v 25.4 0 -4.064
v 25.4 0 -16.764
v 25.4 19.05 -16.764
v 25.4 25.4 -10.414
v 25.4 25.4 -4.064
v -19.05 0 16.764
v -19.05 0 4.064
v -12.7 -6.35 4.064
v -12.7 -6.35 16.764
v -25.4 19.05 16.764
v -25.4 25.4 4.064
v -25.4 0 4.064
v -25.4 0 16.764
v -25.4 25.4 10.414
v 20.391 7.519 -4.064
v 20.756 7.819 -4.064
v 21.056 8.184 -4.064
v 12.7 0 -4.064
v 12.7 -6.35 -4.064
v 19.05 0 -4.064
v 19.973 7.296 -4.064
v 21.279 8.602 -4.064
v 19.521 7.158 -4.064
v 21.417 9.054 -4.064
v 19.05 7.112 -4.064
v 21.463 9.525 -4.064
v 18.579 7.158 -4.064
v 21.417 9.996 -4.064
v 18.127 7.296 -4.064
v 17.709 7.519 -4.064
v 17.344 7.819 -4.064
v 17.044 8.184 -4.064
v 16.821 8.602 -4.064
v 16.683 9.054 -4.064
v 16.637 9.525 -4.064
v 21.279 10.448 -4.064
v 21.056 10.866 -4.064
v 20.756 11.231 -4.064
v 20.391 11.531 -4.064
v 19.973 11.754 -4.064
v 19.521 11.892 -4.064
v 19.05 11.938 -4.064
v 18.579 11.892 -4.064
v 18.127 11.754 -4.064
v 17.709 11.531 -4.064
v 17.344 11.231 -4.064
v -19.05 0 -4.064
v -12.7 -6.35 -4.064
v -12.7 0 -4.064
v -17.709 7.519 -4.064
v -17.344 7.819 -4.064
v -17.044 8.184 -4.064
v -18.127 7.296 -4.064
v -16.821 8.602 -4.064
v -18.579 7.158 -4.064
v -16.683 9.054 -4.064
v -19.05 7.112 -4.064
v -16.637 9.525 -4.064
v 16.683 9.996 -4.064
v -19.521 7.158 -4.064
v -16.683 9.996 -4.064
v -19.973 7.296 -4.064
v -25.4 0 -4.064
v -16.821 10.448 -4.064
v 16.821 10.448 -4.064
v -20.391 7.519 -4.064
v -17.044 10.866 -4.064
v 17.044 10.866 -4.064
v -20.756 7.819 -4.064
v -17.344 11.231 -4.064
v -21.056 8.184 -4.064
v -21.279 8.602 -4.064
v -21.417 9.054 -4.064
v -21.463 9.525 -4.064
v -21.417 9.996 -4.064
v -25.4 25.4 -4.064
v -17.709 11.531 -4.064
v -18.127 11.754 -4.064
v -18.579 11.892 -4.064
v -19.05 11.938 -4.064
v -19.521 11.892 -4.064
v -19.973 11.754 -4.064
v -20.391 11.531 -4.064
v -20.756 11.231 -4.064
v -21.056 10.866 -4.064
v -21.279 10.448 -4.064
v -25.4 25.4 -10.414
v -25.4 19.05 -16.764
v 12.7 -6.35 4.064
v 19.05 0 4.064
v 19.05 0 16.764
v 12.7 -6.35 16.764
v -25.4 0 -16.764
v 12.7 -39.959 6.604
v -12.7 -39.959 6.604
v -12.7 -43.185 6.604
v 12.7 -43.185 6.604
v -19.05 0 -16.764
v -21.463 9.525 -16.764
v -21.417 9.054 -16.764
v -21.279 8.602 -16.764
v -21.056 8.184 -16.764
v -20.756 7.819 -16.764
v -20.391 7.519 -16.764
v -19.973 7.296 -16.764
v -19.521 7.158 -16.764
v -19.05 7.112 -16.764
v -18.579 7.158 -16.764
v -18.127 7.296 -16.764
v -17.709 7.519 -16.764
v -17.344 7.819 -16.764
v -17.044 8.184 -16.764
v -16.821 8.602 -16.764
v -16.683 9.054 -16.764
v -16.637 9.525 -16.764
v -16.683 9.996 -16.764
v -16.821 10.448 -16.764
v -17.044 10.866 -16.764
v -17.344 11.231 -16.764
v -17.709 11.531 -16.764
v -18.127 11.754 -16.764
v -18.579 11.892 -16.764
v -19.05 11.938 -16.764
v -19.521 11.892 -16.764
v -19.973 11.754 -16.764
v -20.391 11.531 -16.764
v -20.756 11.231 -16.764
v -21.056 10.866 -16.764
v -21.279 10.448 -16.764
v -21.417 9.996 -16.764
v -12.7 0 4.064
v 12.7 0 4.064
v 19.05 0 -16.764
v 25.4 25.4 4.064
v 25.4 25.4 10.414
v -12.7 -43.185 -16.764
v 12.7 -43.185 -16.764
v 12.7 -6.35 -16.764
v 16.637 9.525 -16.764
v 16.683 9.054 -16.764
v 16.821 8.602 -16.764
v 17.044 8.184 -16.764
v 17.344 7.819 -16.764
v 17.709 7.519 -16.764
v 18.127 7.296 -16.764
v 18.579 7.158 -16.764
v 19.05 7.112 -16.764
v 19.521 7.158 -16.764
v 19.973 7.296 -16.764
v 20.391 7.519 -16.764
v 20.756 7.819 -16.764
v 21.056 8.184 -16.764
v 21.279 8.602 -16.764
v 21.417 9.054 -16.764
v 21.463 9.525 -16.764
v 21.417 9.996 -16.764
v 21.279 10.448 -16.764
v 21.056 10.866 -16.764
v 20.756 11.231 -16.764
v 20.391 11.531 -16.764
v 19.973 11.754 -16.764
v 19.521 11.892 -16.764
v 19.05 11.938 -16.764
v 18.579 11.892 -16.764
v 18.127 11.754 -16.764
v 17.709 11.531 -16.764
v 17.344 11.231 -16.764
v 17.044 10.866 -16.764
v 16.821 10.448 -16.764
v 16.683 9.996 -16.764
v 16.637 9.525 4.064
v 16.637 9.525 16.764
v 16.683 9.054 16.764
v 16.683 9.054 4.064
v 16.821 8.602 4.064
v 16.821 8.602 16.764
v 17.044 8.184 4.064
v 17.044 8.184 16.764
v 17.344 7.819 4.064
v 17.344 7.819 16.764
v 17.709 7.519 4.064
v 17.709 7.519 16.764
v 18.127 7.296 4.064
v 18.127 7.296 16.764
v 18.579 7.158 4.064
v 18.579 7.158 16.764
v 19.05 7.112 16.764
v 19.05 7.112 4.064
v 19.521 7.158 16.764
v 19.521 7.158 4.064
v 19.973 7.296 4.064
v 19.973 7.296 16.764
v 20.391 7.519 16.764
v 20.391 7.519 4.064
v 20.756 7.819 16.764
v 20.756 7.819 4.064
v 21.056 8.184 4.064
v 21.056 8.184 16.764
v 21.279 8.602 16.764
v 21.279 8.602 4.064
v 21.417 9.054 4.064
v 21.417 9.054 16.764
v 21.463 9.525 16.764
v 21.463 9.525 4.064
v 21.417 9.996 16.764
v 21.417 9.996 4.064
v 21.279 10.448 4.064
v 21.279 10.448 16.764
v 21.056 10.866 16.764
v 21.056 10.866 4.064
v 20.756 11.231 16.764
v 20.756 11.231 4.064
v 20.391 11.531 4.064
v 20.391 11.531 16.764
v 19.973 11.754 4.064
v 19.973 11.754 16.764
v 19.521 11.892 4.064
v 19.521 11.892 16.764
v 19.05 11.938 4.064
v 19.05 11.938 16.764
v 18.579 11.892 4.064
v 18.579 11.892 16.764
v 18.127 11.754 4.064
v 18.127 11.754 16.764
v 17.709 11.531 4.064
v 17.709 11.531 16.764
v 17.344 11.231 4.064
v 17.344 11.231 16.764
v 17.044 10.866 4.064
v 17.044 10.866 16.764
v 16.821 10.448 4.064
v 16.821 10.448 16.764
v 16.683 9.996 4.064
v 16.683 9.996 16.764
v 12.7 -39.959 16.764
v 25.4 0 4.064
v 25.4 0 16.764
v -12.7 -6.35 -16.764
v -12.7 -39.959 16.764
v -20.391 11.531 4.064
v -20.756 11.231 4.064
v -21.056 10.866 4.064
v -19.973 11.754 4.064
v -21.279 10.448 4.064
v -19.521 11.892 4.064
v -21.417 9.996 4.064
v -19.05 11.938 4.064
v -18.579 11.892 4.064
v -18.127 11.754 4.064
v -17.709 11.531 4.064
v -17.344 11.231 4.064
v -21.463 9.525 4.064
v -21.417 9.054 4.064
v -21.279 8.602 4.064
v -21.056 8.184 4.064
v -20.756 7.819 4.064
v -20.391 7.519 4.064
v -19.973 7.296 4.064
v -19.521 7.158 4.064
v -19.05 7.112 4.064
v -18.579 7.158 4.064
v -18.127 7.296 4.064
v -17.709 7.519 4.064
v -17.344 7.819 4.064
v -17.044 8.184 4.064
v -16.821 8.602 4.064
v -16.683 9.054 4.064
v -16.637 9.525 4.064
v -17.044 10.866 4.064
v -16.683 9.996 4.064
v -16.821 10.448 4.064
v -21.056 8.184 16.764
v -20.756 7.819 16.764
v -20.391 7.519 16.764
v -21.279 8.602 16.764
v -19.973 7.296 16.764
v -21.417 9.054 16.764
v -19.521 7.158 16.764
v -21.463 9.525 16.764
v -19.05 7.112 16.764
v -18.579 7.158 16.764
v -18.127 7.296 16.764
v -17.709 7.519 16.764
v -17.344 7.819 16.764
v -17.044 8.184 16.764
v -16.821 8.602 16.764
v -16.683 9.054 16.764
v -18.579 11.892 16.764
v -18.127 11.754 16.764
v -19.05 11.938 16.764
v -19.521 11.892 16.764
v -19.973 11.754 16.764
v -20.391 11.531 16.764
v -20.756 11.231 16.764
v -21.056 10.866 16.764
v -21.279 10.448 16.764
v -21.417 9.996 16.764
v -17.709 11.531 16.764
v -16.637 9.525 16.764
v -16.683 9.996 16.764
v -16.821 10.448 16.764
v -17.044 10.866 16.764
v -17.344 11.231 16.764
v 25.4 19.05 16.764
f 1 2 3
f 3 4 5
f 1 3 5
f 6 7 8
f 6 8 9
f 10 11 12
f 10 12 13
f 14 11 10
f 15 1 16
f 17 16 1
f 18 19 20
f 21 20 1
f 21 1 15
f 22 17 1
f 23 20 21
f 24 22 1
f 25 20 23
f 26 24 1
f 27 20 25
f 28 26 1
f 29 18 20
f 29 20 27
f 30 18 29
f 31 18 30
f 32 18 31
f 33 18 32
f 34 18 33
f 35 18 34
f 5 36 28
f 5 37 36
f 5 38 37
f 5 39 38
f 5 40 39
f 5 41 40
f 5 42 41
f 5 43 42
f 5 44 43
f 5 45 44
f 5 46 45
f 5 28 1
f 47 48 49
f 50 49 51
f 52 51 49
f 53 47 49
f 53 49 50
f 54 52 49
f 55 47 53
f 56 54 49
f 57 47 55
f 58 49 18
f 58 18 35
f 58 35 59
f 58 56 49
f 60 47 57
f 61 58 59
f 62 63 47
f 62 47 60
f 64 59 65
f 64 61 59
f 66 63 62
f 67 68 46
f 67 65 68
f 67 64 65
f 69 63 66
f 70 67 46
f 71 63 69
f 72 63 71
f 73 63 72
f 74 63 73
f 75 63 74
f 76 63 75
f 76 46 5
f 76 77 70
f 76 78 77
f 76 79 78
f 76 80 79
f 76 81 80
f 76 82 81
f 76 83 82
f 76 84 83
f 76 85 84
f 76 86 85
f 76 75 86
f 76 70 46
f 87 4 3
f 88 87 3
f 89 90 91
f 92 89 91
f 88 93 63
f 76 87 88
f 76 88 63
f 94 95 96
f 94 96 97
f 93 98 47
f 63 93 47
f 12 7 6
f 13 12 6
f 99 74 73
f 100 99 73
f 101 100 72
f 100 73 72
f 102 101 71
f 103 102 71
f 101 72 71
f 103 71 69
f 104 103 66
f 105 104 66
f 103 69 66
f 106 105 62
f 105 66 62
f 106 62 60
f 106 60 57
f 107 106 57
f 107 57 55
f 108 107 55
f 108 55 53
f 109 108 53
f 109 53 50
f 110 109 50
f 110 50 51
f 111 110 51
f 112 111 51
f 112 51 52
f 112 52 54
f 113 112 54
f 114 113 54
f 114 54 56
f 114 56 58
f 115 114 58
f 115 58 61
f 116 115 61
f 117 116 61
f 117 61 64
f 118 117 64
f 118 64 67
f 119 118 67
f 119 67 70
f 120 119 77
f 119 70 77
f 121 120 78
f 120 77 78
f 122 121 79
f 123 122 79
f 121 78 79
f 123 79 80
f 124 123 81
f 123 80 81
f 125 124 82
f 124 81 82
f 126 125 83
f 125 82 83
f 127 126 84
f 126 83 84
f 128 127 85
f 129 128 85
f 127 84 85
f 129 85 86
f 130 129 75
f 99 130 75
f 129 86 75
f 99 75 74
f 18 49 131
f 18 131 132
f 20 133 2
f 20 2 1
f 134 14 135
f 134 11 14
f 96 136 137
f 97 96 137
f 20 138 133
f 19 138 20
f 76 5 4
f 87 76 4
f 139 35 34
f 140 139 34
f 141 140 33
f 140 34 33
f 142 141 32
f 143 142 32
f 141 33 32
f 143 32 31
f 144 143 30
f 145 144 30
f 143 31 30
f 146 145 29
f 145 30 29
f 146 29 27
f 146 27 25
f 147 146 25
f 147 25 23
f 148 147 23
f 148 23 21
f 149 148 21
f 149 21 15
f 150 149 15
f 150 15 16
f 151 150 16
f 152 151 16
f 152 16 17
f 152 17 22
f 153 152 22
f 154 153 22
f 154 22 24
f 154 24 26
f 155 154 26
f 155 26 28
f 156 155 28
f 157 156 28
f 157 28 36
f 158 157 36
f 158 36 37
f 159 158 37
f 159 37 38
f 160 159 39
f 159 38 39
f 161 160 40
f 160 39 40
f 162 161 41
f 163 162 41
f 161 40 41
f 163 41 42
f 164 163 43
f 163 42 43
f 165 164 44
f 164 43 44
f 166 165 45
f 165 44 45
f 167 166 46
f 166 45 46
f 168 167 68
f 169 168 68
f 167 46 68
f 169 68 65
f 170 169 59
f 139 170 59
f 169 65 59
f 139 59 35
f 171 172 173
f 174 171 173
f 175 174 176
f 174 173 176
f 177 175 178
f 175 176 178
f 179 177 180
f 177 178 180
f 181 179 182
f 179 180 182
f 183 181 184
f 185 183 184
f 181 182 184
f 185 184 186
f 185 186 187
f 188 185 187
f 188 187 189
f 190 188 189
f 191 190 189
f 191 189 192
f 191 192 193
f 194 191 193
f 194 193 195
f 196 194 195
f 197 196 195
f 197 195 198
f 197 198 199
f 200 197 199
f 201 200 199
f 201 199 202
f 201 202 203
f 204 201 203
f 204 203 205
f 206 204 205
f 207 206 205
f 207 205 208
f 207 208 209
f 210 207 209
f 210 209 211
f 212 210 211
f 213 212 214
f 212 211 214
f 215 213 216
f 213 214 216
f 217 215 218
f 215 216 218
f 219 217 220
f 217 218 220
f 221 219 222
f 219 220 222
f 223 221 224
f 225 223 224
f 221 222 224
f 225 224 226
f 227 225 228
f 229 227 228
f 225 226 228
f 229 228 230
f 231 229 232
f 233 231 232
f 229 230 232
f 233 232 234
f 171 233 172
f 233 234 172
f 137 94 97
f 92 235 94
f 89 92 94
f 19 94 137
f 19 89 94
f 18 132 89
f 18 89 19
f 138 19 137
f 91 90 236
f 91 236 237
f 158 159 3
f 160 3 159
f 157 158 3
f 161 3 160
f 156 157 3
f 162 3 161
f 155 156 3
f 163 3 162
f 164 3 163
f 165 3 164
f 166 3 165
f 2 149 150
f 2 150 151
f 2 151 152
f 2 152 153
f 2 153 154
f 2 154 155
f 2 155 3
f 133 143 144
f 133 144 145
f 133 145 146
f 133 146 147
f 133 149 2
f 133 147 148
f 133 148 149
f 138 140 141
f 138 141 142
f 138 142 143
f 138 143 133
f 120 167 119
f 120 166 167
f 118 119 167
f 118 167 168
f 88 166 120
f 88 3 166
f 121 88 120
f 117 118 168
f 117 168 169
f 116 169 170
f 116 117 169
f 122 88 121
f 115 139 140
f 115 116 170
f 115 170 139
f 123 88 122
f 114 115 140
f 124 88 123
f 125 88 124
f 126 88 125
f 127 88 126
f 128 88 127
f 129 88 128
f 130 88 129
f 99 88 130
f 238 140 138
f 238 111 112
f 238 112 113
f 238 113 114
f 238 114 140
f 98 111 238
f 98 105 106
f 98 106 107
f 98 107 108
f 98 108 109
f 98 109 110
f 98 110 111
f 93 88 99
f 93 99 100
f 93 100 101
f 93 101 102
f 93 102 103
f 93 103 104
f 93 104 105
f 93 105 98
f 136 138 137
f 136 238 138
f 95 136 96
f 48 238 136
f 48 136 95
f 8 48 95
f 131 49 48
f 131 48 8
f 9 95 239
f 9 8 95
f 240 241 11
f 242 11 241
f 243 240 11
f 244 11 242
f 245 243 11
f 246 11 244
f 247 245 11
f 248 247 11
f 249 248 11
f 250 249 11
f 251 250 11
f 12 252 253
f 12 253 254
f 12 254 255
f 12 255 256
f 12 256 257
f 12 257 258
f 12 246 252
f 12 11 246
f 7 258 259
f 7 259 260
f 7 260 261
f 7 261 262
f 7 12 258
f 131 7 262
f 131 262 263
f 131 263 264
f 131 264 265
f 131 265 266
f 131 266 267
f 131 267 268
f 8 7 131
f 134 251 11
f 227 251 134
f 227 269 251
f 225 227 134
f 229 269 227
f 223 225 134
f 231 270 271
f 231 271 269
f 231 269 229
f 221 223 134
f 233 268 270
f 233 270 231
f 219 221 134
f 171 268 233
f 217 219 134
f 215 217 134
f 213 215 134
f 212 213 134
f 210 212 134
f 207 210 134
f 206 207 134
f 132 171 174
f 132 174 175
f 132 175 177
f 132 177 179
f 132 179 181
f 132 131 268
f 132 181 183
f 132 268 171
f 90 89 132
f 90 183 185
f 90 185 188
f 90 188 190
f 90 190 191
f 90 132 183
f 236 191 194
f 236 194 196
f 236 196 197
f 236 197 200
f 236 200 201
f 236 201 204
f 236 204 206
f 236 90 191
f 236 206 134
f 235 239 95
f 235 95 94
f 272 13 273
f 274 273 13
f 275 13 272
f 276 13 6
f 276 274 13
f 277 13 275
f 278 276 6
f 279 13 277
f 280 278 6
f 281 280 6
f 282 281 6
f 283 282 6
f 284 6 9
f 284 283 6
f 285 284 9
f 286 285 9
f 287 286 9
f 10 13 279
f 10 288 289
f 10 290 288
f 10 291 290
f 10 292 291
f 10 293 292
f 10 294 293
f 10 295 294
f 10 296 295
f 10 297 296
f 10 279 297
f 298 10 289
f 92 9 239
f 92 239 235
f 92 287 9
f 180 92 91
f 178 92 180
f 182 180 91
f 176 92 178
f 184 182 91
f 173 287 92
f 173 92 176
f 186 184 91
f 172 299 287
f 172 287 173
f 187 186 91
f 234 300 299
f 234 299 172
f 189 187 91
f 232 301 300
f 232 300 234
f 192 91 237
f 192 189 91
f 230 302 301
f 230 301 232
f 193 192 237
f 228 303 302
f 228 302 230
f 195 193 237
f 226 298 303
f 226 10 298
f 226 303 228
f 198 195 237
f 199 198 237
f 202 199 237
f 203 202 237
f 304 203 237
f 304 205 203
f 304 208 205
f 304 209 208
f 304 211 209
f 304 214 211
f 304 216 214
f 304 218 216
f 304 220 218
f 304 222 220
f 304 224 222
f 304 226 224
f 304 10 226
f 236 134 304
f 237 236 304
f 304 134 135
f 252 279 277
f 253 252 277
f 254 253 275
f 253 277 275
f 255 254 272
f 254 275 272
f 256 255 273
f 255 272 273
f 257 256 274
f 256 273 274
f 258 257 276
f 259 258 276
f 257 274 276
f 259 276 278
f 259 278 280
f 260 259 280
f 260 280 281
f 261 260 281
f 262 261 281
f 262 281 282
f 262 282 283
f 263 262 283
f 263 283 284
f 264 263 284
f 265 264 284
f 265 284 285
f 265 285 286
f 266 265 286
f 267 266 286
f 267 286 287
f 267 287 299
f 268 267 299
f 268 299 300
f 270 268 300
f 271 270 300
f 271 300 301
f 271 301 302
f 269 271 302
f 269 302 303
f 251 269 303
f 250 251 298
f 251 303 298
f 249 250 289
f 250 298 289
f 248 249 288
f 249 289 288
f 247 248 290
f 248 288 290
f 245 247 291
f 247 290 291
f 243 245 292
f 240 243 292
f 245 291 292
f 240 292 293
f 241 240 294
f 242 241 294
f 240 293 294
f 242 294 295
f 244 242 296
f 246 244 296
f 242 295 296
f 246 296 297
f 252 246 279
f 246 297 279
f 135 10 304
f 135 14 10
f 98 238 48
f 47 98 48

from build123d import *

# Parameters (mm, degrees)
SKETCH1_W             = 25.4
SKETCH1_H             = 12.7
BOSS_EXTRUDE1_DEPTH   = 25.4
BOSS_EXTRUDE1_2_DEPTH = 25.4
SKETCH1_3_W           = 25.4
SKETCH1_3_H           = 33.528
BOSS_EXTRUDE2_DEPTH   = 43.184694682
SKETCH2_W             = 25.4
SKETCH2_H             = 3.2258
CUT_EXTRUDE1_DEPTH    = 10.16
CHAMFER1_SIZE         = 6.35
BOSS_EXTRUDE3_DEPTH   = 12.7
SKETCH6_R             = 2.413
CUT_EXTRUDE3_DEPTH    = 61.284364795
CHAMFER2_SIZE         = 6.35


with BuildPart() as part:
    # Sketch1 → Boss-Extrude1 (new body)
    with BuildSketch(Plane(origin=(0, 0, 0), x_dir=(1, 0, 0), z_dir=(0, 1, 0))):
        with Locations((0, -10.414)):
            Rectangle(SKETCH1_W, SKETCH1_H)
    extrude(amount=BOSS_EXTRUDE1_DEPTH)



with BuildPart() as body_2:
    # Sketch1 → Boss-Extrude1 2 (new body)
    with BuildSketch(Plane(origin=(0, 0, 0), x_dir=(1, 0, 0), z_dir=(0, 1, 0))):
        with Locations((0, 10.414)):
            Rectangle(SKETCH1_W, SKETCH1_H)
    extrude(amount=BOSS_EXTRUDE1_2_DEPTH)


with BuildPart() as part_1:
    add(part.part)

    add(body_2.part)  # Boss-Extrude2 merges body 2
    # Sketch1<3> → Boss-Extrude2 (add)
    with BuildSketch(Plane(origin=(0, 0, 0), x_dir=(1, 0, 0), z_dir=(0, 1, 0))):
        Rectangle(SKETCH1_3_W, SKETCH1_3_H)
    extrude(amount=-BOSS_EXTRUDE2_DEPTH)

    # Sketch2 → Cut-Extrude1 (cut)
    with BuildSketch(Plane.XY.offset(16.764)):
        with Locations((0, -41.571794682)):
            Rectangle(SKETCH2_W, SKETCH2_H)
    extrude(amount=-CUT_EXTRUDE1_DEPTH, mode=Mode.SUBTRACT)

    # Chamfer1
    chamfer1_edges = [part_1.edges().sort_by_distance(p)[0] for p in [
        (0, 25.4, -16.764),
        (0, 25.4, 16.764),
    ]]
    chamfer(chamfer1_edges, length=CHAMFER1_SIZE)

    # Sketch5 → Boss-Extrude3 (add)
    with BuildSketch(Plane.ZY.offset(12.7)):
        Polygon((-10.414, 25.4), (-16.764, 19.05), (-16.764, 0), (-4.064, 0), (-4.064, 25.4), align=None)
        Polygon((4.064, 25.4), (4.064, 0), (16.764, 0), (16.764, 19.05), (10.414, 25.4), align=None)
    boss_extrude3 = extrude(amount=BOSS_EXTRUDE3_DEPTH)

    # Mirror1: Boss-Extrude3 across plane
    add(boss_extrude3.mirror(Plane(origin=(0, 0, 0), x_dir=(0, 0, 1), z_dir=(1, 0, 0))))

    # Sketch6 → Cut-Extrude3 (cut, through all)
    with BuildSketch(Plane.XY.offset(16.764)):
        with Locations((-19.05, 9.525)):
            Circle(SKETCH6_R)
        with Locations((19.05, 9.525)):
            Circle(SKETCH6_R)
    extrude(amount=-CUT_EXTRUDE3_DEPTH, mode=Mode.SUBTRACT)

    # Chamfer2
    chamfer2_edges = [part_1.edges().sort_by_distance(p)[0] for p in [
        (12.7, 0, -10.414),
        (12.7, 0, 10.414),
        (-12.7, 0, -10.414),
        (-12.7, 0, 10.414),
    ]]
    chamfer(chamfer2_edges, length=CHAMFER2_SIZE)


solid = part_1.part
